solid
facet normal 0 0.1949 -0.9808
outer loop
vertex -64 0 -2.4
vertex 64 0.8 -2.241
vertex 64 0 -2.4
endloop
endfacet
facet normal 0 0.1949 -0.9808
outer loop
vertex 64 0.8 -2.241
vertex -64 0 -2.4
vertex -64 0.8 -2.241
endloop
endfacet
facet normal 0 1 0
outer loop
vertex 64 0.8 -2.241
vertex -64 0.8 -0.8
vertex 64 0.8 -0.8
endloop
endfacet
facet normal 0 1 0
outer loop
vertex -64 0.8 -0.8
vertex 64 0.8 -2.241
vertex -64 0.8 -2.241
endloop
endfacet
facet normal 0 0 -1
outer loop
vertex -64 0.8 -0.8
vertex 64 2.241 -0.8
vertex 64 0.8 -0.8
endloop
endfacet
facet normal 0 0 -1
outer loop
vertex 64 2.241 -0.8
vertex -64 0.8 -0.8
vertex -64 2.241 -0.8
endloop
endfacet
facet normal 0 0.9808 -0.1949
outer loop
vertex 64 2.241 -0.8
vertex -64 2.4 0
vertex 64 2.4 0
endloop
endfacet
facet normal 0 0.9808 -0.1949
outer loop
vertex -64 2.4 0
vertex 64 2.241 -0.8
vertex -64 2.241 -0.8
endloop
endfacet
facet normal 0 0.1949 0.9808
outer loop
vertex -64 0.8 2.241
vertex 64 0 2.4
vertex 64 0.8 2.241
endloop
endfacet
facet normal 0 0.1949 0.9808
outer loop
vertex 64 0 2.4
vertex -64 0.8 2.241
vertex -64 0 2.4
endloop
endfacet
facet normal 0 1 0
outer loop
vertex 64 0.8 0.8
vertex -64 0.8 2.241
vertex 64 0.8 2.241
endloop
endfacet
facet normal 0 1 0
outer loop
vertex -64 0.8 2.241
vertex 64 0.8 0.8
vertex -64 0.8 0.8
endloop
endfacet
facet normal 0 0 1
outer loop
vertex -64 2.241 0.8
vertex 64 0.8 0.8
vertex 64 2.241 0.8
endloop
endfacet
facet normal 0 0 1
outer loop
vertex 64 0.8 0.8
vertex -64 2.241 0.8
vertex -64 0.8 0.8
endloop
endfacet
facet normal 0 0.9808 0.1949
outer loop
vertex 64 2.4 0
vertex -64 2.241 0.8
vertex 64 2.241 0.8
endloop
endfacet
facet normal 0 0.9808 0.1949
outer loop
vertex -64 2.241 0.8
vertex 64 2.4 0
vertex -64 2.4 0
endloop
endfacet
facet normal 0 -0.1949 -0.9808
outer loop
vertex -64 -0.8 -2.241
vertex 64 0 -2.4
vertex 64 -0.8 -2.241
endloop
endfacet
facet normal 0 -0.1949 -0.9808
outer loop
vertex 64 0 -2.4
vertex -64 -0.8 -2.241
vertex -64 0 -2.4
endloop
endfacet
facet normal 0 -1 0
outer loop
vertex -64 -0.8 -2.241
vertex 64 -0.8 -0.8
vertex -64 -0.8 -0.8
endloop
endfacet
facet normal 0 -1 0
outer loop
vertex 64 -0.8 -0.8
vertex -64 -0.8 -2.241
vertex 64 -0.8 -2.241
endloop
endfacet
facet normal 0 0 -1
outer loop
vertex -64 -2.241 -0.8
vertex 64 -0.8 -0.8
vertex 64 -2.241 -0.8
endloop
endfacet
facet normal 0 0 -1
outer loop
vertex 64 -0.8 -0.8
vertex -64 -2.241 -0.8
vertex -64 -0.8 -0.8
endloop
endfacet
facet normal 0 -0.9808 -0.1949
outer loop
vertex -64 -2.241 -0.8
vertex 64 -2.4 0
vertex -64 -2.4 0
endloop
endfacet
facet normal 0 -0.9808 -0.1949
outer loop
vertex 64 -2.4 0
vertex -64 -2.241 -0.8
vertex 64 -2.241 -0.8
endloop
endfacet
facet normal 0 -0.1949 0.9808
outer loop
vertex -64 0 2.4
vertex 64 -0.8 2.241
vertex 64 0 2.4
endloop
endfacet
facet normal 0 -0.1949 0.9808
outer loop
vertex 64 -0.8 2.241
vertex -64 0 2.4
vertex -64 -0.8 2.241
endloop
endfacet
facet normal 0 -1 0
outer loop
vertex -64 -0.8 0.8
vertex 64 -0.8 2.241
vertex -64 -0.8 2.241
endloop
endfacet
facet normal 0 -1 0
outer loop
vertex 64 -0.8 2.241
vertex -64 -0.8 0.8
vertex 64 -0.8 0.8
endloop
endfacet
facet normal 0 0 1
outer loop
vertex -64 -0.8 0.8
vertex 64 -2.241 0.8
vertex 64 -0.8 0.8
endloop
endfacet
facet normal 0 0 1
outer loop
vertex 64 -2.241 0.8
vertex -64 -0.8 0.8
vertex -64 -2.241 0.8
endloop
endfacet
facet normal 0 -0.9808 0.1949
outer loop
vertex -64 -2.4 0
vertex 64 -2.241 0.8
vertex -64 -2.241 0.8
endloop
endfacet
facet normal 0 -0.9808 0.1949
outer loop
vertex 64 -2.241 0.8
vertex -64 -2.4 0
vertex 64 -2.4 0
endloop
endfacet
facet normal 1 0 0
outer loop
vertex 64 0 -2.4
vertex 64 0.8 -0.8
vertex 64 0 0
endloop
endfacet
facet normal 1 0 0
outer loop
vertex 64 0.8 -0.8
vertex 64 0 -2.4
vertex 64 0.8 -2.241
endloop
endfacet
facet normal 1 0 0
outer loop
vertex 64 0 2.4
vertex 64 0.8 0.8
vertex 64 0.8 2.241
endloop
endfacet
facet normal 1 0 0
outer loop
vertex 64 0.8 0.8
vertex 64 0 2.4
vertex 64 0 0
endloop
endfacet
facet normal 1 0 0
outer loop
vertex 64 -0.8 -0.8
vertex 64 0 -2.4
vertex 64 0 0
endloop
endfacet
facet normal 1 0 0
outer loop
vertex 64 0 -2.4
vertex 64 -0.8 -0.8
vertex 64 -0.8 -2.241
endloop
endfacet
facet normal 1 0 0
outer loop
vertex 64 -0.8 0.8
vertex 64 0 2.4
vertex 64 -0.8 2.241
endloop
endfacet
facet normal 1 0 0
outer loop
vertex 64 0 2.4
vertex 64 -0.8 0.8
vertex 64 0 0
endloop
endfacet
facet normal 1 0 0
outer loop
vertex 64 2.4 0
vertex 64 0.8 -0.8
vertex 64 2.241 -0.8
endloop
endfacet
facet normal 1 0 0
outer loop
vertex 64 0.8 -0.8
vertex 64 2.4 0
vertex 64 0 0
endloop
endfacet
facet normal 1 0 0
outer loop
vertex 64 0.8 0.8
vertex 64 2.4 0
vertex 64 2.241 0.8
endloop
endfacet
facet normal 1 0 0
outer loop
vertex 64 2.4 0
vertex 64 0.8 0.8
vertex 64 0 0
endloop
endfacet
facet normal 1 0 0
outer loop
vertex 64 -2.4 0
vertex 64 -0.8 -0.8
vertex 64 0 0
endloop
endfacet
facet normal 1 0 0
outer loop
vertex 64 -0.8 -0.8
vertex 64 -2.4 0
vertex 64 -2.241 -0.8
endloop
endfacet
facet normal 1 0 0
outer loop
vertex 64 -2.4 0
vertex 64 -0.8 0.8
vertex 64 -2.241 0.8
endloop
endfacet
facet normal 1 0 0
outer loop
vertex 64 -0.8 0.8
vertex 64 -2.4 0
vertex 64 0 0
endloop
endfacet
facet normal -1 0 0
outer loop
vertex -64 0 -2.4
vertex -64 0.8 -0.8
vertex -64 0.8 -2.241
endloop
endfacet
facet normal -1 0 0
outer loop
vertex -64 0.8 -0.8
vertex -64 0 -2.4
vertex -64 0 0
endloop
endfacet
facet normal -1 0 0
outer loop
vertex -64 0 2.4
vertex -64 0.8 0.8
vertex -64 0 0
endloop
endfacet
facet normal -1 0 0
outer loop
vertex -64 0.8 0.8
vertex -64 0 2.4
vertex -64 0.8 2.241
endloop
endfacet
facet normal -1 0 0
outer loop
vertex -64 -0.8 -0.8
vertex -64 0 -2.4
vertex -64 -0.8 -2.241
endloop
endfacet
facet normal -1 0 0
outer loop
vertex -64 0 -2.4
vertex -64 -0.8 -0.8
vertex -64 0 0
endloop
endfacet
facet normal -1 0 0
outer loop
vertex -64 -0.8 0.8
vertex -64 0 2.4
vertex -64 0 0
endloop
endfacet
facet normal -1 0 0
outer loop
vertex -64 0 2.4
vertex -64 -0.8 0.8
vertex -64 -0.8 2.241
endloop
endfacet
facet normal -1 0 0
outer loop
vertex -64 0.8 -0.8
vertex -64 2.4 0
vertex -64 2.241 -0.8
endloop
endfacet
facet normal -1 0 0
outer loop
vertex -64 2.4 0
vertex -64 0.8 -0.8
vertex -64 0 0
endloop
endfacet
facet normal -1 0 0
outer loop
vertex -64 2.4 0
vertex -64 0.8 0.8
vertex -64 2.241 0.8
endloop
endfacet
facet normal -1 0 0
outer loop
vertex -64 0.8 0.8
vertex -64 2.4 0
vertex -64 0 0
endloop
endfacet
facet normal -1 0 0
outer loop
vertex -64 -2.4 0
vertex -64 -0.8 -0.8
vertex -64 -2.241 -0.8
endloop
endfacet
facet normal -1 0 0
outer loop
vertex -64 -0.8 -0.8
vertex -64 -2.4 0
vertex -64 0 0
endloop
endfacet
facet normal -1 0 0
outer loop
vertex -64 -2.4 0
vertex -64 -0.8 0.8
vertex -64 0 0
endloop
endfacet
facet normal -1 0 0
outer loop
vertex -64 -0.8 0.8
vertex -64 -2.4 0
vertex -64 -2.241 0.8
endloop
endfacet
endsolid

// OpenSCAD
// file: ../p/axle.scad
use <../lib.scad>
function ldraw_lib__axle() = [
// 0 Technic Axle
// 0 Name: axle.dat
// 0 Author: James Jessiman
// 0 !LDRAW_ORG Primitive UPDATE 2024-02
// 0 !LICENSE Licensed under CC BY 4.0 : see CAreadme.txt
// 
// 0 BFC CERTIFY CCW
  [0,"BFC","CERTIFY"],
  [0,"BFC","CCW"],
// 
// 0 !HISTORY 2000-04-23 [sbliss] Added conditional edges along outermost diameters
// 0 !HISTORY 2000-05-07 [PTadmin] Official Update 2000-01
// 0 !HISTORY 2002-11-08 [OrionP] Adjusted fit and precision
// 0 !HISTORY 2003-03-12 [PTadmin] Official Update 2003-01
// 0 !HISTORY 2007-06-24 [PTadmin] Header formatted for Contributor Agreement
// 0 !HISTORY 2008-07-01 [PTadmin] Official Update 2008-01
// 0 !HISTORY 2024-02-06 [Holly-Wood] Added 'Technic' to the description
// 0 !HISTORY 2024-03-24 [OrionP] Official Update 2024-02
// 
// 5 24 6 0 0 6 1 0 5.602 0 2 5.602 0 -2
  [5,24,6,0,0,6,1,0,5.602,0,2,5.602,0,-2],
// 5 24 0 0 6 0 1 6 2 0 5.602 -2 0 5.602
  [5,24,0,0,6,0,1,6,2,0,5.602,-2,0,5.602],
// 5 24 -6 0 0 -6 1 0 -5.602 0 -2 -5.602 0 2
  [5,24,-6,0,0,-6,1,0,-5.602,0,-2,-5.602,0,2],
// 5 24 0 0 -6 0 1 -6 -2 0 -5.602 2 0 -5.602
  [5,24,0,0,-6,0,1,-6,-2,0,-5.602,2,0,-5.602],
// 
// 2 24 6 0 0 5.602 0 2
  [2,24,6,0,0,5.602,0,2],
// 2 24 5.602 0 2 2 0 2
  [2,24,5.602,0,2,2,0,2],
// 2 24 2 0 2 2 0 5.602
  [2,24,2,0,2,2,0,5.602],
// 2 24 2 0 5.602 0 0 6
  [2,24,2,0,5.602,0,0,6],
// 2 24 -6 0 0 -5.602 0 2
  [2,24,-6,0,0,-5.602,0,2],
// 2 24 -5.602 0 2 -2 0 2
  [2,24,-5.602,0,2,-2,0,2],
// 2 24 -2 0 2 -2 0 5.602
  [2,24,-2,0,2,-2,0,5.602],
// 2 24 -2 0 5.602 -0 0 6
  [2,24,-2,0,5.602,-0,0,6],
// 2 24 6 0 -0 5.602 0 -2
  [2,24,6,0,-0,5.602,0,-2],
// 2 24 5.602 0 -2 2 0 -2
  [2,24,5.602,0,-2,2,0,-2],
// 2 24 2 0 -2 2 0 -5.602
  [2,24,2,0,-2,2,0,-5.602],
// 2 24 2 0 -5.602 0 0 -6
  [2,24,2,0,-5.602,0,0,-6],
// 2 24 -6 0 -0 -5.602 0 -2
  [2,24,-6,0,-0,-5.602,0,-2],
// 2 24 -5.602 0 -2 -2 0 -2
  [2,24,-5.602,0,-2,-2,0,-2],
// 2 24 -2 0 -2 -2 0 -5.602
  [2,24,-2,0,-2,-2,0,-5.602],
// 2 24 -2 0 -5.602 -0 0 -6
  [2,24,-2,0,-5.602,-0,0,-6],
// 2 24 6 1 0 5.602 1 2
  [2,24,6,1,0,5.602,1,2],
// 2 24 5.602 1 2 2 1 2
  [2,24,5.602,1,2,2,1,2],
// 2 24 2 1 2 2 1 5.602
  [2,24,2,1,2,2,1,5.602],
// 2 24 2 1 5.602 0 1 6
  [2,24,2,1,5.602,0,1,6],
// 2 24 -6 1 0 -5.602 1 2
  [2,24,-6,1,0,-5.602,1,2],
// 2 24 -5.602 1 2 -2 1 2
  [2,24,-5.602,1,2,-2,1,2],
// 2 24 -2 1 2 -2 1 5.602
  [2,24,-2,1,2,-2,1,5.602],
// 2 24 -2 1 5.602 -0 1 6
  [2,24,-2,1,5.602,-0,1,6],
// 2 24 6 1 -0 5.602 1 -2
  [2,24,6,1,-0,5.602,1,-2],
// 2 24 5.602 1 -2 2 1 -2
  [2,24,5.602,1,-2,2,1,-2],
// 2 24 2 1 -2 2 1 -5.602
  [2,24,2,1,-2,2,1,-5.602],
// 2 24 2 1 -5.602 0 1 -6
  [2,24,2,1,-5.602,0,1,-6],
// 2 24 -6 1 -0 -5.602 1 -2
  [2,24,-6,1,-0,-5.602,1,-2],
// 2 24 -5.602 1 -2 -2 1 -2
  [2,24,-5.602,1,-2,-2,1,-2],
// 2 24 -2 1 -2 -2 1 -5.602
  [2,24,-2,1,-2,-2,1,-5.602],
// 2 24 -2 1 -5.602 -0 1 -6
  [2,24,-2,1,-5.602,-0,1,-6],
// 
// 2 24 5.602 0 2 5.602 1 2
  [2,24,5.602,0,2,5.602,1,2],
// 2 24 2 0 2 2 1 2
  [2,24,2,0,2,2,1,2],
// 2 24 2 0 5.602 2 1 5.602
  [2,24,2,0,5.602,2,1,5.602],
// 2 24 -5.602 0 2 -5.602 1 2
  [2,24,-5.602,0,2,-5.602,1,2],
// 2 24 -2 0 2 -2 1 2
  [2,24,-2,0,2,-2,1,2],
// 2 24 -2 0 5.602 -2 1 5.602
  [2,24,-2,0,5.602,-2,1,5.602],
// 2 24 5.602 0 -2 5.602 1 -2
  [2,24,5.602,0,-2,5.602,1,-2],
// 2 24 2 0 -2 2 1 -2
  [2,24,2,0,-2,2,1,-2],
// 2 24 2 0 -5.602 2 1 -5.602
  [2,24,2,0,-5.602,2,1,-5.602],
// 2 24 -5.602 0 -2 -5.602 1 -2
  [2,24,-5.602,0,-2,-5.602,1,-2],
// 2 24 -2 0 -2 -2 1 -2
  [2,24,-2,0,-2,-2,1,-2],
// 2 24 -2 0 -5.602 -2 1 -5.602
  [2,24,-2,0,-5.602,-2,1,-5.602],
// 
// 4 16 6 0 0 6 1 0 5.602 1 2 5.602 0 2
  [4,16,6,0,0,6,1,0,5.602,1,2,5.602,0,2],
// 4 16 5.602 0 2 5.602 1 2 2 1 2 2 0 2
  [4,16,5.602,0,2,5.602,1,2,2,1,2,2,0,2],
// 4 16 2 0 2 2 1 2 2 1 5.602 2 0 5.602
  [4,16,2,0,2,2,1,2,2,1,5.602,2,0,5.602],
// 4 16 2 0 5.602 2 1 5.602 0 1 6 0 0 6
  [4,16,2,0,5.602,2,1,5.602,0,1,6,0,0,6],
// 4 16 -6 0 0 -5.602 0 2 -5.602 1 2 -6 1 0
  [4,16,-6,0,0,-5.602,0,2,-5.602,1,2,-6,1,0],
// 4 16 -5.602 0 2 -2 0 2 -2 1 2 -5.602 1 2
  [4,16,-5.602,0,2,-2,0,2,-2,1,2,-5.602,1,2],
// 4 16 -2 0 2 -2 0 5.602 -2 1 5.602 -2 1 2
  [4,16,-2,0,2,-2,0,5.602,-2,1,5.602,-2,1,2],
// 4 16 -2 0 5.602 -0 0 6 -0 1 6 -2 1 5.602
  [4,16,-2,0,5.602,-0,0,6,-0,1,6,-2,1,5.602],
// 4 16 6 0 -0 5.602 0 -2 5.602 1 -2 6 1 -0
  [4,16,6,0,-0,5.602,0,-2,5.602,1,-2,6,1,-0],
// 4 16 5.602 0 -2 2 0 -2 2 1 -2 5.602 1 -2
  [4,16,5.602,0,-2,2,0,-2,2,1,-2,5.602,1,-2],
// 4 16 2 0 -2 2 0 -5.602 2 1 -5.602 2 1 -2
  [4,16,2,0,-2,2,0,-5.602,2,1,-5.602,2,1,-2],
// 4 16 2 0 -5.602 0 0 -6 0 1 -6 2 1 -5.602
  [4,16,2,0,-5.602,0,0,-6,0,1,-6,2,1,-5.602],
// 4 16 -6 0 -0 -6 1 -0 -5.602 1 -2 -5.602 0 -2
  [4,16,-6,0,-0,-6,1,-0,-5.602,1,-2,-5.602,0,-2],
// 4 16 -5.602 0 -2 -5.602 1 -2 -2 1 -2 -2 0 -2
  [4,16,-5.602,0,-2,-5.602,1,-2,-2,1,-2,-2,0,-2],
// 4 16 -2 0 -2 -2 1 -2 -2 1 -5.602 -2 0 -5.602
  [4,16,-2,0,-2,-2,1,-2,-2,1,-5.602,-2,0,-5.602],
// 4 16 -2 0 -5.602 -2 1 -5.602 -0 1 -6 -0 0 -6
  [4,16,-2,0,-5.602,-2,1,-5.602,-0,1,-6,-0,0,-6],
// 
// 4 16 6 0 0 5.602 0 2 2 0 2 0 0 0
  [4,16,6,0,0,5.602,0,2,2,0,2,0,0,0],
// 4 16 -6 0 0 0 0 0 -2 0 2 -5.602 0 2
  [4,16,-6,0,0,0,0,0,-2,0,2,-5.602,0,2],
// 4 16 6 0 0 0 0 0 2 0 -2 5.602 0 -2
  [4,16,6,0,0,0,0,0,2,0,-2,5.602,0,-2],
// 4 16 -6 0 0 -5.602 0 -2 -2 0 -2 0 0 0
  [4,16,-6,0,0,-5.602,0,-2,-2,0,-2,0,0,0],
// 4 16 0 0 6 0 0 0 2 0 2 2 0 5.602
  [4,16,0,0,6,0,0,0,2,0,2,2,0,5.602],
// 4 16 0 0 6 -2 0 5.602 -2 0 2 0 0 0
  [4,16,0,0,6,-2,0,5.602,-2,0,2,0,0,0],
// 4 16 0 0 -6 2 0 -5.602 2 0 -2 0 0 0
  [4,16,0,0,-6,2,0,-5.602,2,0,-2,0,0,0],
// 4 16 0 0 -6 0 0 0 -2 0 -2 -2 0 -5.602
  [4,16,0,0,-6,0,0,0,-2,0,-2,-2,0,-5.602],
// 4 16 6 1 0 0 1 0 2 1 2 5.602 1 2
  [4,16,6,1,0,0,1,0,2,1,2,5.602,1,2],
// 4 16 -6 1 0 -5.602 1 2 -2 1 2 0 1 0
  [4,16,-6,1,0,-5.602,1,2,-2,1,2,0,1,0],
// 4 16 6 1 0 5.602 1 -2 2 1 -2 0 1 0
  [4,16,6,1,0,5.602,1,-2,2,1,-2,0,1,0],
// 4 16 -6 1 0 0 1 0 -2 1 -2 -5.602 1 -2
  [4,16,-6,1,0,0,1,0,-2,1,-2,-5.602,1,-2],
// 4 16 0 1 6 2 1 5.602 2 1 2 0 1 0
  [4,16,0,1,6,2,1,5.602,2,1,2,0,1,0],
// 4 16 0 1 6 0 1 0 -2 1 2 -2 1 5.602
  [4,16,0,1,6,0,1,0,-2,1,2,-2,1,5.602],
// 4 16 0 1 -6 0 1 0 2 1 -2 2 1 -5.602
  [4,16,0,1,-6,0,1,0,2,1,-2,2,1,-5.602],
// 4 16 0 1 -6 -2 1 -5.602 -2 1 -2 0 1 0
  [4,16,0,1,-6,-2,1,-5.602,-2,1,-2,0,1,0],
];
module ldraw_lib__axle(step=0, col=false, unit=2/5, alt=false, line=0.2, solid=!$preview)
    makepoly(ldraw_lib__axle(), step=step, col=col, unit=unit, alt=alt, line=line, solid=solid);
ldraw_lib__axle(line=0.2);
// file: 50451.scad
use <../lib.scad>
use <../p/axle.scad>
function ldraw_lib__50451() = [
// 0 Technic Axle 16
// 0 Name: 50451.dat
// 0 Author: Guy Vivan [guyvivan]
// 0 !LDRAW_ORG Part UPDATE 2009-01
// 0 !LICENSE Licensed under CC BY 2.0 and CC BY 4.0 : see CAreadme.txt
// 
// 0 BFC CERTIFY CCW
  [0,"BFC","CERTIFY"],
  [0,"BFC","CCW"],
// 
// 0 !HISTORY 2009-05-02 [PTadmin] Official Update 2009-01
// 
// 
// 1 16 160 0 0 0 -320 0 1 0 0 0 0 1 axle.dat
  [1,16,160,0,0,0,-320,0,1,0,0,0,0,1, ldraw_lib__axle()],
// 0
];
module ldraw_lib__50451(step=0, col=false, unit=2/5, alt=false, line=0.2, solid=!$preview)
    makepoly(ldraw_lib__50451(), step=step, col=col, unit=unit, alt=alt, line=line, solid=solid);
ldraw_lib__50451(line=0.2);
// main file
use <../lib.scad>
use <50451.scad>
function ldraw_lib__69732() = [
// 0 =Technic Axle 16
// 0 Name: 69732.dat
// 0 Author: [PTadmin]
// 0 !LDRAW_ORG Part Alias UPDATE 2025-01
// 0 !LICENSE Licensed under CC BY 4.0 : see CAreadme.txt
// 
// 0 BFC CERTIFY CCW
  [0,"BFC","CERTIFY"],
  [0,"BFC","CCW"],
// 
// 0 !HISTORY 2025-01-20 [OrionP] Official Update 2025-01
// 
// 
// 0 // Alias of 50451
// 
// 1 16 0 0 0 1 0 0 0 1 0 0 0 1 50451.dat
  [1,16,0,0,0,1,0,0,0,1,0,0,0,1, ldraw_lib__50451()],
];
module ldraw_lib__69732(step=0, col=false, unit=2/5, alt=false, line=0.2, solid=!$preview)
    makepoly(ldraw_lib__69732(), step=step, col=col, unit=unit, alt=alt, line=line, solid=solid);
ldraw_lib__69732(line=0.2);
